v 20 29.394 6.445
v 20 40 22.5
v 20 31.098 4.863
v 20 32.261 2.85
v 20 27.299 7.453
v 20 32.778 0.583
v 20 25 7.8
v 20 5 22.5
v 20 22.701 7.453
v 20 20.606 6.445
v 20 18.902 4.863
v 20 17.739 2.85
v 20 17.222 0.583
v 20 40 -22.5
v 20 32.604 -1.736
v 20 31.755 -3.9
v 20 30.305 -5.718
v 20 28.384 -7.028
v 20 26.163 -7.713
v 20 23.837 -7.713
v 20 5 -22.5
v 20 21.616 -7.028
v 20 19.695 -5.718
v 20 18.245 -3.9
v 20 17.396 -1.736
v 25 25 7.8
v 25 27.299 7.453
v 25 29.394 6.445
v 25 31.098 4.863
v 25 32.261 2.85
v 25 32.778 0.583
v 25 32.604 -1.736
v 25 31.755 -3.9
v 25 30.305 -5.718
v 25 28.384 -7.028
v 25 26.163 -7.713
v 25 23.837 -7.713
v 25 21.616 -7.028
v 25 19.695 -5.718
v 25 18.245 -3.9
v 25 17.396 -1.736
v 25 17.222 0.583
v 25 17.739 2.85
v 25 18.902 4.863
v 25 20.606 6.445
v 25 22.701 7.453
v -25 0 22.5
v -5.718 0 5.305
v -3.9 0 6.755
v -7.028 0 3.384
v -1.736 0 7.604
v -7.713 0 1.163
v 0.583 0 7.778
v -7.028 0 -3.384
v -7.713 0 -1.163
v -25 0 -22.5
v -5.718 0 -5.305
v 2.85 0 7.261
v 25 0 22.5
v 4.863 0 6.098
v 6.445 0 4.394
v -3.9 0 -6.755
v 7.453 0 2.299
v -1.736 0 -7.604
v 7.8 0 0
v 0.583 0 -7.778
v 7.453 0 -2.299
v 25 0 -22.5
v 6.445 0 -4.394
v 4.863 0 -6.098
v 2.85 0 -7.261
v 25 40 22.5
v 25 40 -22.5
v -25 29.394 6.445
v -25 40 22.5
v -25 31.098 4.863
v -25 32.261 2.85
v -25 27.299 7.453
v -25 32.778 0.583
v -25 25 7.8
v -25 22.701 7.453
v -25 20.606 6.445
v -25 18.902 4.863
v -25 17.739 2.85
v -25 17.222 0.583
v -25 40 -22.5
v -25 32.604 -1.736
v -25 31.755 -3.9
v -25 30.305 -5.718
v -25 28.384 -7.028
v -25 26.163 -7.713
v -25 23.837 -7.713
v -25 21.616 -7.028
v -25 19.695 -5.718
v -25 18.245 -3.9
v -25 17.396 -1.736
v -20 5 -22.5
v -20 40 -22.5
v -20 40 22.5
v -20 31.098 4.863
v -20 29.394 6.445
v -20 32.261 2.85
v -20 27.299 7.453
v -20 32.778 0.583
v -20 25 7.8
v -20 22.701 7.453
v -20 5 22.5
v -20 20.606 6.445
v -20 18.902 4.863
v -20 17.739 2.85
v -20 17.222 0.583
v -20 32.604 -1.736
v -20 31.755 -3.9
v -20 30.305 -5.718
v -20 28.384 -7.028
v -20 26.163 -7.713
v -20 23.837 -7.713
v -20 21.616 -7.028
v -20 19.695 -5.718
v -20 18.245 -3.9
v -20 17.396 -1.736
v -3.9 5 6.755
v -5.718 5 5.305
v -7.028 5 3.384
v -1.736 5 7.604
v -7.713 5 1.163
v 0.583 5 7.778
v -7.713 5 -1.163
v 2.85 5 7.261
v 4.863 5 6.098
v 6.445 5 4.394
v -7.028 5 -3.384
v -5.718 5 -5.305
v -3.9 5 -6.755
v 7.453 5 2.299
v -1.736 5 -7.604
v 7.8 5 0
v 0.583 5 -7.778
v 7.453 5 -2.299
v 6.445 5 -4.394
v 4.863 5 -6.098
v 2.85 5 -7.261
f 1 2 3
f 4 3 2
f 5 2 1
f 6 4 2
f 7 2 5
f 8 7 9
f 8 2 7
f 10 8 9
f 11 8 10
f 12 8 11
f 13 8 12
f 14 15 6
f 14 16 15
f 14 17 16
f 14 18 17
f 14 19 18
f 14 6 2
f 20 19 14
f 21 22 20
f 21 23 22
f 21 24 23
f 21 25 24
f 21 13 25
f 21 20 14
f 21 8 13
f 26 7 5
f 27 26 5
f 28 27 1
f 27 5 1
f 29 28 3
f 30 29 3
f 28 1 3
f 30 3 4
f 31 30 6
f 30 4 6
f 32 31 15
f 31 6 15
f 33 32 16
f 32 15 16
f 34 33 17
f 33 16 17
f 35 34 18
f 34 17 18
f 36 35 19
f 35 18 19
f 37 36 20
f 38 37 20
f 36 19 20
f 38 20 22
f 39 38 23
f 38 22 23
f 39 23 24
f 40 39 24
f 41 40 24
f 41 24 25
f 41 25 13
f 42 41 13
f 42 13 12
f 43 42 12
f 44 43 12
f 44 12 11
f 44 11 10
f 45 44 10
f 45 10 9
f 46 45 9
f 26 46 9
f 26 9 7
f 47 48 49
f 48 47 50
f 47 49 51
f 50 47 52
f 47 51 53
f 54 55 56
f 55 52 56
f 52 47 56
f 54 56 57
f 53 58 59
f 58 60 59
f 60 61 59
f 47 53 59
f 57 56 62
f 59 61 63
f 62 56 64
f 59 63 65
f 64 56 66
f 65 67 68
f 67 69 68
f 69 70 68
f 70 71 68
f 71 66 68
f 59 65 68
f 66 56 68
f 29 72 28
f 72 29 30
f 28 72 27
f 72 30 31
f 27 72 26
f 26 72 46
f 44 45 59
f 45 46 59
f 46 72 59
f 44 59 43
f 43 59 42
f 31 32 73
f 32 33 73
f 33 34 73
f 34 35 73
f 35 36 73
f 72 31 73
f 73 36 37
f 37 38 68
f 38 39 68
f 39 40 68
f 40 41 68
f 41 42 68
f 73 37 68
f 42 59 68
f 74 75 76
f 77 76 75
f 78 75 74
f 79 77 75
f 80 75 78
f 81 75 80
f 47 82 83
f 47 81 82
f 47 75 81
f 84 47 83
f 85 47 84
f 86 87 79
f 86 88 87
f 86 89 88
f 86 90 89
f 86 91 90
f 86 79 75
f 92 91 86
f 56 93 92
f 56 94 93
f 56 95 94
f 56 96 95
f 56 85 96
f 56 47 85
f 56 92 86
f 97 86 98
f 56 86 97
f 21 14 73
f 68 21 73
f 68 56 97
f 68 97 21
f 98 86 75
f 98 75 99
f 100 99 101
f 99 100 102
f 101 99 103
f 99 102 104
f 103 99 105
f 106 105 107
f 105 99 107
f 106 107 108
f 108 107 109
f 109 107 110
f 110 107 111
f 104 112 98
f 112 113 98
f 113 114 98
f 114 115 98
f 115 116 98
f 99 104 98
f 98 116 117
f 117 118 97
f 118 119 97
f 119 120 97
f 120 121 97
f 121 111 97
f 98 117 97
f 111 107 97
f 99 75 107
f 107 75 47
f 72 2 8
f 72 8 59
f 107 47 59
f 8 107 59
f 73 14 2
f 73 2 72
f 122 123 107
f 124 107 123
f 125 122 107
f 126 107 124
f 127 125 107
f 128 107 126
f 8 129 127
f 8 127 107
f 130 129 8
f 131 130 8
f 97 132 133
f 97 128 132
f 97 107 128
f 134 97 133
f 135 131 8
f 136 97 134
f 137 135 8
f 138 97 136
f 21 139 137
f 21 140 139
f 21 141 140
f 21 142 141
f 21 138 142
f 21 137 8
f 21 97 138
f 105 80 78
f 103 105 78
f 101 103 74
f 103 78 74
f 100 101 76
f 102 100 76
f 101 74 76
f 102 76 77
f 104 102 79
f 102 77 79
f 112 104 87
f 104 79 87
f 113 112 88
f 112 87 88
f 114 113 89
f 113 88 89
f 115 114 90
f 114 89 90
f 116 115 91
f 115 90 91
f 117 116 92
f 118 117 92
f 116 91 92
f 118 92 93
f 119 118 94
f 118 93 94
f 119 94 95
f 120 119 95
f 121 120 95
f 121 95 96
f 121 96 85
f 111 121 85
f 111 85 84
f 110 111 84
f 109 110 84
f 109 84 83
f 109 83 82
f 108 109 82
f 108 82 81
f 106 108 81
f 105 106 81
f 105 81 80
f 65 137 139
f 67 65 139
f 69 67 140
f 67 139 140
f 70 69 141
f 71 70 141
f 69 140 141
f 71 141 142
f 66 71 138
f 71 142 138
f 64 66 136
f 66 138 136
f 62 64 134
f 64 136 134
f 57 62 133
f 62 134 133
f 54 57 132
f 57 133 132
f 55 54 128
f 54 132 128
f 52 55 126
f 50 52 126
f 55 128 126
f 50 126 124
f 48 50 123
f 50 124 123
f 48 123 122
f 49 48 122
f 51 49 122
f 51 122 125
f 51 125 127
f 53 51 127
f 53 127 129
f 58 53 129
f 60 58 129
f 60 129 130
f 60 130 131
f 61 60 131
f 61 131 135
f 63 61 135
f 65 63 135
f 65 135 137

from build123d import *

# Parameters (mm, degrees)
SKETCH1_W           = 50
SKETCH1_H           = 45
BOSS_EXTRUDE1_DEPTH = 5
SKETCH5_W           = 5
SKETCH5_H           = 45
BOSS_EXTRUDE3_DEPTH = 35
SKETCH9_R           = 7.8
CUT_EXTRUDE5_DEPTH  = 10
SKETCH11_R          = 7.8
CUT_EXTRUDE8_DEPTH  = 51


with BuildPart() as part:
    # Sketch1 → Boss-Extrude1 (new body)
    with BuildSketch(Plane(origin=(0, 0, 0), x_dir=(1, 0, 0), z_dir=(0, 1, 0))):
        Rectangle(SKETCH1_W, SKETCH1_H)
    extrude(amount=BOSS_EXTRUDE1_DEPTH)

    # Sketch5 → Boss-Extrude3 (add)
    with BuildSketch(Plane(origin=(0, 5, 0), x_dir=(1, 0, 0), z_dir=(0, 1, 0))):
        with Locations((22.5, 0)):
            Rectangle(SKETCH5_W, SKETCH5_H)
        with Locations((-22.5, 0)):
            Rectangle(SKETCH5_W, SKETCH5_H)
    extrude(amount=BOSS_EXTRUDE3_DEPTH)

    # Sketch9 → Cut-Extrude5 (cut)
    with BuildSketch(Plane(origin=(0, 5, 0), x_dir=(1, 0, 0), z_dir=(0, 1, 0))):
        Circle(SKETCH9_R)
    extrude(amount=-CUT_EXTRUDE5_DEPTH, mode=Mode.SUBTRACT)

    # Sketch11 → Cut-Extrude8 (cut, through all)
    with BuildSketch(Plane.ZY.offset(25)):
        with Locations((0, 25)):
            Circle(SKETCH11_R)
    extrude(amount=-CUT_EXTRUDE8_DEPTH, mode=Mode.SUBTRACT)


solid = part.part
